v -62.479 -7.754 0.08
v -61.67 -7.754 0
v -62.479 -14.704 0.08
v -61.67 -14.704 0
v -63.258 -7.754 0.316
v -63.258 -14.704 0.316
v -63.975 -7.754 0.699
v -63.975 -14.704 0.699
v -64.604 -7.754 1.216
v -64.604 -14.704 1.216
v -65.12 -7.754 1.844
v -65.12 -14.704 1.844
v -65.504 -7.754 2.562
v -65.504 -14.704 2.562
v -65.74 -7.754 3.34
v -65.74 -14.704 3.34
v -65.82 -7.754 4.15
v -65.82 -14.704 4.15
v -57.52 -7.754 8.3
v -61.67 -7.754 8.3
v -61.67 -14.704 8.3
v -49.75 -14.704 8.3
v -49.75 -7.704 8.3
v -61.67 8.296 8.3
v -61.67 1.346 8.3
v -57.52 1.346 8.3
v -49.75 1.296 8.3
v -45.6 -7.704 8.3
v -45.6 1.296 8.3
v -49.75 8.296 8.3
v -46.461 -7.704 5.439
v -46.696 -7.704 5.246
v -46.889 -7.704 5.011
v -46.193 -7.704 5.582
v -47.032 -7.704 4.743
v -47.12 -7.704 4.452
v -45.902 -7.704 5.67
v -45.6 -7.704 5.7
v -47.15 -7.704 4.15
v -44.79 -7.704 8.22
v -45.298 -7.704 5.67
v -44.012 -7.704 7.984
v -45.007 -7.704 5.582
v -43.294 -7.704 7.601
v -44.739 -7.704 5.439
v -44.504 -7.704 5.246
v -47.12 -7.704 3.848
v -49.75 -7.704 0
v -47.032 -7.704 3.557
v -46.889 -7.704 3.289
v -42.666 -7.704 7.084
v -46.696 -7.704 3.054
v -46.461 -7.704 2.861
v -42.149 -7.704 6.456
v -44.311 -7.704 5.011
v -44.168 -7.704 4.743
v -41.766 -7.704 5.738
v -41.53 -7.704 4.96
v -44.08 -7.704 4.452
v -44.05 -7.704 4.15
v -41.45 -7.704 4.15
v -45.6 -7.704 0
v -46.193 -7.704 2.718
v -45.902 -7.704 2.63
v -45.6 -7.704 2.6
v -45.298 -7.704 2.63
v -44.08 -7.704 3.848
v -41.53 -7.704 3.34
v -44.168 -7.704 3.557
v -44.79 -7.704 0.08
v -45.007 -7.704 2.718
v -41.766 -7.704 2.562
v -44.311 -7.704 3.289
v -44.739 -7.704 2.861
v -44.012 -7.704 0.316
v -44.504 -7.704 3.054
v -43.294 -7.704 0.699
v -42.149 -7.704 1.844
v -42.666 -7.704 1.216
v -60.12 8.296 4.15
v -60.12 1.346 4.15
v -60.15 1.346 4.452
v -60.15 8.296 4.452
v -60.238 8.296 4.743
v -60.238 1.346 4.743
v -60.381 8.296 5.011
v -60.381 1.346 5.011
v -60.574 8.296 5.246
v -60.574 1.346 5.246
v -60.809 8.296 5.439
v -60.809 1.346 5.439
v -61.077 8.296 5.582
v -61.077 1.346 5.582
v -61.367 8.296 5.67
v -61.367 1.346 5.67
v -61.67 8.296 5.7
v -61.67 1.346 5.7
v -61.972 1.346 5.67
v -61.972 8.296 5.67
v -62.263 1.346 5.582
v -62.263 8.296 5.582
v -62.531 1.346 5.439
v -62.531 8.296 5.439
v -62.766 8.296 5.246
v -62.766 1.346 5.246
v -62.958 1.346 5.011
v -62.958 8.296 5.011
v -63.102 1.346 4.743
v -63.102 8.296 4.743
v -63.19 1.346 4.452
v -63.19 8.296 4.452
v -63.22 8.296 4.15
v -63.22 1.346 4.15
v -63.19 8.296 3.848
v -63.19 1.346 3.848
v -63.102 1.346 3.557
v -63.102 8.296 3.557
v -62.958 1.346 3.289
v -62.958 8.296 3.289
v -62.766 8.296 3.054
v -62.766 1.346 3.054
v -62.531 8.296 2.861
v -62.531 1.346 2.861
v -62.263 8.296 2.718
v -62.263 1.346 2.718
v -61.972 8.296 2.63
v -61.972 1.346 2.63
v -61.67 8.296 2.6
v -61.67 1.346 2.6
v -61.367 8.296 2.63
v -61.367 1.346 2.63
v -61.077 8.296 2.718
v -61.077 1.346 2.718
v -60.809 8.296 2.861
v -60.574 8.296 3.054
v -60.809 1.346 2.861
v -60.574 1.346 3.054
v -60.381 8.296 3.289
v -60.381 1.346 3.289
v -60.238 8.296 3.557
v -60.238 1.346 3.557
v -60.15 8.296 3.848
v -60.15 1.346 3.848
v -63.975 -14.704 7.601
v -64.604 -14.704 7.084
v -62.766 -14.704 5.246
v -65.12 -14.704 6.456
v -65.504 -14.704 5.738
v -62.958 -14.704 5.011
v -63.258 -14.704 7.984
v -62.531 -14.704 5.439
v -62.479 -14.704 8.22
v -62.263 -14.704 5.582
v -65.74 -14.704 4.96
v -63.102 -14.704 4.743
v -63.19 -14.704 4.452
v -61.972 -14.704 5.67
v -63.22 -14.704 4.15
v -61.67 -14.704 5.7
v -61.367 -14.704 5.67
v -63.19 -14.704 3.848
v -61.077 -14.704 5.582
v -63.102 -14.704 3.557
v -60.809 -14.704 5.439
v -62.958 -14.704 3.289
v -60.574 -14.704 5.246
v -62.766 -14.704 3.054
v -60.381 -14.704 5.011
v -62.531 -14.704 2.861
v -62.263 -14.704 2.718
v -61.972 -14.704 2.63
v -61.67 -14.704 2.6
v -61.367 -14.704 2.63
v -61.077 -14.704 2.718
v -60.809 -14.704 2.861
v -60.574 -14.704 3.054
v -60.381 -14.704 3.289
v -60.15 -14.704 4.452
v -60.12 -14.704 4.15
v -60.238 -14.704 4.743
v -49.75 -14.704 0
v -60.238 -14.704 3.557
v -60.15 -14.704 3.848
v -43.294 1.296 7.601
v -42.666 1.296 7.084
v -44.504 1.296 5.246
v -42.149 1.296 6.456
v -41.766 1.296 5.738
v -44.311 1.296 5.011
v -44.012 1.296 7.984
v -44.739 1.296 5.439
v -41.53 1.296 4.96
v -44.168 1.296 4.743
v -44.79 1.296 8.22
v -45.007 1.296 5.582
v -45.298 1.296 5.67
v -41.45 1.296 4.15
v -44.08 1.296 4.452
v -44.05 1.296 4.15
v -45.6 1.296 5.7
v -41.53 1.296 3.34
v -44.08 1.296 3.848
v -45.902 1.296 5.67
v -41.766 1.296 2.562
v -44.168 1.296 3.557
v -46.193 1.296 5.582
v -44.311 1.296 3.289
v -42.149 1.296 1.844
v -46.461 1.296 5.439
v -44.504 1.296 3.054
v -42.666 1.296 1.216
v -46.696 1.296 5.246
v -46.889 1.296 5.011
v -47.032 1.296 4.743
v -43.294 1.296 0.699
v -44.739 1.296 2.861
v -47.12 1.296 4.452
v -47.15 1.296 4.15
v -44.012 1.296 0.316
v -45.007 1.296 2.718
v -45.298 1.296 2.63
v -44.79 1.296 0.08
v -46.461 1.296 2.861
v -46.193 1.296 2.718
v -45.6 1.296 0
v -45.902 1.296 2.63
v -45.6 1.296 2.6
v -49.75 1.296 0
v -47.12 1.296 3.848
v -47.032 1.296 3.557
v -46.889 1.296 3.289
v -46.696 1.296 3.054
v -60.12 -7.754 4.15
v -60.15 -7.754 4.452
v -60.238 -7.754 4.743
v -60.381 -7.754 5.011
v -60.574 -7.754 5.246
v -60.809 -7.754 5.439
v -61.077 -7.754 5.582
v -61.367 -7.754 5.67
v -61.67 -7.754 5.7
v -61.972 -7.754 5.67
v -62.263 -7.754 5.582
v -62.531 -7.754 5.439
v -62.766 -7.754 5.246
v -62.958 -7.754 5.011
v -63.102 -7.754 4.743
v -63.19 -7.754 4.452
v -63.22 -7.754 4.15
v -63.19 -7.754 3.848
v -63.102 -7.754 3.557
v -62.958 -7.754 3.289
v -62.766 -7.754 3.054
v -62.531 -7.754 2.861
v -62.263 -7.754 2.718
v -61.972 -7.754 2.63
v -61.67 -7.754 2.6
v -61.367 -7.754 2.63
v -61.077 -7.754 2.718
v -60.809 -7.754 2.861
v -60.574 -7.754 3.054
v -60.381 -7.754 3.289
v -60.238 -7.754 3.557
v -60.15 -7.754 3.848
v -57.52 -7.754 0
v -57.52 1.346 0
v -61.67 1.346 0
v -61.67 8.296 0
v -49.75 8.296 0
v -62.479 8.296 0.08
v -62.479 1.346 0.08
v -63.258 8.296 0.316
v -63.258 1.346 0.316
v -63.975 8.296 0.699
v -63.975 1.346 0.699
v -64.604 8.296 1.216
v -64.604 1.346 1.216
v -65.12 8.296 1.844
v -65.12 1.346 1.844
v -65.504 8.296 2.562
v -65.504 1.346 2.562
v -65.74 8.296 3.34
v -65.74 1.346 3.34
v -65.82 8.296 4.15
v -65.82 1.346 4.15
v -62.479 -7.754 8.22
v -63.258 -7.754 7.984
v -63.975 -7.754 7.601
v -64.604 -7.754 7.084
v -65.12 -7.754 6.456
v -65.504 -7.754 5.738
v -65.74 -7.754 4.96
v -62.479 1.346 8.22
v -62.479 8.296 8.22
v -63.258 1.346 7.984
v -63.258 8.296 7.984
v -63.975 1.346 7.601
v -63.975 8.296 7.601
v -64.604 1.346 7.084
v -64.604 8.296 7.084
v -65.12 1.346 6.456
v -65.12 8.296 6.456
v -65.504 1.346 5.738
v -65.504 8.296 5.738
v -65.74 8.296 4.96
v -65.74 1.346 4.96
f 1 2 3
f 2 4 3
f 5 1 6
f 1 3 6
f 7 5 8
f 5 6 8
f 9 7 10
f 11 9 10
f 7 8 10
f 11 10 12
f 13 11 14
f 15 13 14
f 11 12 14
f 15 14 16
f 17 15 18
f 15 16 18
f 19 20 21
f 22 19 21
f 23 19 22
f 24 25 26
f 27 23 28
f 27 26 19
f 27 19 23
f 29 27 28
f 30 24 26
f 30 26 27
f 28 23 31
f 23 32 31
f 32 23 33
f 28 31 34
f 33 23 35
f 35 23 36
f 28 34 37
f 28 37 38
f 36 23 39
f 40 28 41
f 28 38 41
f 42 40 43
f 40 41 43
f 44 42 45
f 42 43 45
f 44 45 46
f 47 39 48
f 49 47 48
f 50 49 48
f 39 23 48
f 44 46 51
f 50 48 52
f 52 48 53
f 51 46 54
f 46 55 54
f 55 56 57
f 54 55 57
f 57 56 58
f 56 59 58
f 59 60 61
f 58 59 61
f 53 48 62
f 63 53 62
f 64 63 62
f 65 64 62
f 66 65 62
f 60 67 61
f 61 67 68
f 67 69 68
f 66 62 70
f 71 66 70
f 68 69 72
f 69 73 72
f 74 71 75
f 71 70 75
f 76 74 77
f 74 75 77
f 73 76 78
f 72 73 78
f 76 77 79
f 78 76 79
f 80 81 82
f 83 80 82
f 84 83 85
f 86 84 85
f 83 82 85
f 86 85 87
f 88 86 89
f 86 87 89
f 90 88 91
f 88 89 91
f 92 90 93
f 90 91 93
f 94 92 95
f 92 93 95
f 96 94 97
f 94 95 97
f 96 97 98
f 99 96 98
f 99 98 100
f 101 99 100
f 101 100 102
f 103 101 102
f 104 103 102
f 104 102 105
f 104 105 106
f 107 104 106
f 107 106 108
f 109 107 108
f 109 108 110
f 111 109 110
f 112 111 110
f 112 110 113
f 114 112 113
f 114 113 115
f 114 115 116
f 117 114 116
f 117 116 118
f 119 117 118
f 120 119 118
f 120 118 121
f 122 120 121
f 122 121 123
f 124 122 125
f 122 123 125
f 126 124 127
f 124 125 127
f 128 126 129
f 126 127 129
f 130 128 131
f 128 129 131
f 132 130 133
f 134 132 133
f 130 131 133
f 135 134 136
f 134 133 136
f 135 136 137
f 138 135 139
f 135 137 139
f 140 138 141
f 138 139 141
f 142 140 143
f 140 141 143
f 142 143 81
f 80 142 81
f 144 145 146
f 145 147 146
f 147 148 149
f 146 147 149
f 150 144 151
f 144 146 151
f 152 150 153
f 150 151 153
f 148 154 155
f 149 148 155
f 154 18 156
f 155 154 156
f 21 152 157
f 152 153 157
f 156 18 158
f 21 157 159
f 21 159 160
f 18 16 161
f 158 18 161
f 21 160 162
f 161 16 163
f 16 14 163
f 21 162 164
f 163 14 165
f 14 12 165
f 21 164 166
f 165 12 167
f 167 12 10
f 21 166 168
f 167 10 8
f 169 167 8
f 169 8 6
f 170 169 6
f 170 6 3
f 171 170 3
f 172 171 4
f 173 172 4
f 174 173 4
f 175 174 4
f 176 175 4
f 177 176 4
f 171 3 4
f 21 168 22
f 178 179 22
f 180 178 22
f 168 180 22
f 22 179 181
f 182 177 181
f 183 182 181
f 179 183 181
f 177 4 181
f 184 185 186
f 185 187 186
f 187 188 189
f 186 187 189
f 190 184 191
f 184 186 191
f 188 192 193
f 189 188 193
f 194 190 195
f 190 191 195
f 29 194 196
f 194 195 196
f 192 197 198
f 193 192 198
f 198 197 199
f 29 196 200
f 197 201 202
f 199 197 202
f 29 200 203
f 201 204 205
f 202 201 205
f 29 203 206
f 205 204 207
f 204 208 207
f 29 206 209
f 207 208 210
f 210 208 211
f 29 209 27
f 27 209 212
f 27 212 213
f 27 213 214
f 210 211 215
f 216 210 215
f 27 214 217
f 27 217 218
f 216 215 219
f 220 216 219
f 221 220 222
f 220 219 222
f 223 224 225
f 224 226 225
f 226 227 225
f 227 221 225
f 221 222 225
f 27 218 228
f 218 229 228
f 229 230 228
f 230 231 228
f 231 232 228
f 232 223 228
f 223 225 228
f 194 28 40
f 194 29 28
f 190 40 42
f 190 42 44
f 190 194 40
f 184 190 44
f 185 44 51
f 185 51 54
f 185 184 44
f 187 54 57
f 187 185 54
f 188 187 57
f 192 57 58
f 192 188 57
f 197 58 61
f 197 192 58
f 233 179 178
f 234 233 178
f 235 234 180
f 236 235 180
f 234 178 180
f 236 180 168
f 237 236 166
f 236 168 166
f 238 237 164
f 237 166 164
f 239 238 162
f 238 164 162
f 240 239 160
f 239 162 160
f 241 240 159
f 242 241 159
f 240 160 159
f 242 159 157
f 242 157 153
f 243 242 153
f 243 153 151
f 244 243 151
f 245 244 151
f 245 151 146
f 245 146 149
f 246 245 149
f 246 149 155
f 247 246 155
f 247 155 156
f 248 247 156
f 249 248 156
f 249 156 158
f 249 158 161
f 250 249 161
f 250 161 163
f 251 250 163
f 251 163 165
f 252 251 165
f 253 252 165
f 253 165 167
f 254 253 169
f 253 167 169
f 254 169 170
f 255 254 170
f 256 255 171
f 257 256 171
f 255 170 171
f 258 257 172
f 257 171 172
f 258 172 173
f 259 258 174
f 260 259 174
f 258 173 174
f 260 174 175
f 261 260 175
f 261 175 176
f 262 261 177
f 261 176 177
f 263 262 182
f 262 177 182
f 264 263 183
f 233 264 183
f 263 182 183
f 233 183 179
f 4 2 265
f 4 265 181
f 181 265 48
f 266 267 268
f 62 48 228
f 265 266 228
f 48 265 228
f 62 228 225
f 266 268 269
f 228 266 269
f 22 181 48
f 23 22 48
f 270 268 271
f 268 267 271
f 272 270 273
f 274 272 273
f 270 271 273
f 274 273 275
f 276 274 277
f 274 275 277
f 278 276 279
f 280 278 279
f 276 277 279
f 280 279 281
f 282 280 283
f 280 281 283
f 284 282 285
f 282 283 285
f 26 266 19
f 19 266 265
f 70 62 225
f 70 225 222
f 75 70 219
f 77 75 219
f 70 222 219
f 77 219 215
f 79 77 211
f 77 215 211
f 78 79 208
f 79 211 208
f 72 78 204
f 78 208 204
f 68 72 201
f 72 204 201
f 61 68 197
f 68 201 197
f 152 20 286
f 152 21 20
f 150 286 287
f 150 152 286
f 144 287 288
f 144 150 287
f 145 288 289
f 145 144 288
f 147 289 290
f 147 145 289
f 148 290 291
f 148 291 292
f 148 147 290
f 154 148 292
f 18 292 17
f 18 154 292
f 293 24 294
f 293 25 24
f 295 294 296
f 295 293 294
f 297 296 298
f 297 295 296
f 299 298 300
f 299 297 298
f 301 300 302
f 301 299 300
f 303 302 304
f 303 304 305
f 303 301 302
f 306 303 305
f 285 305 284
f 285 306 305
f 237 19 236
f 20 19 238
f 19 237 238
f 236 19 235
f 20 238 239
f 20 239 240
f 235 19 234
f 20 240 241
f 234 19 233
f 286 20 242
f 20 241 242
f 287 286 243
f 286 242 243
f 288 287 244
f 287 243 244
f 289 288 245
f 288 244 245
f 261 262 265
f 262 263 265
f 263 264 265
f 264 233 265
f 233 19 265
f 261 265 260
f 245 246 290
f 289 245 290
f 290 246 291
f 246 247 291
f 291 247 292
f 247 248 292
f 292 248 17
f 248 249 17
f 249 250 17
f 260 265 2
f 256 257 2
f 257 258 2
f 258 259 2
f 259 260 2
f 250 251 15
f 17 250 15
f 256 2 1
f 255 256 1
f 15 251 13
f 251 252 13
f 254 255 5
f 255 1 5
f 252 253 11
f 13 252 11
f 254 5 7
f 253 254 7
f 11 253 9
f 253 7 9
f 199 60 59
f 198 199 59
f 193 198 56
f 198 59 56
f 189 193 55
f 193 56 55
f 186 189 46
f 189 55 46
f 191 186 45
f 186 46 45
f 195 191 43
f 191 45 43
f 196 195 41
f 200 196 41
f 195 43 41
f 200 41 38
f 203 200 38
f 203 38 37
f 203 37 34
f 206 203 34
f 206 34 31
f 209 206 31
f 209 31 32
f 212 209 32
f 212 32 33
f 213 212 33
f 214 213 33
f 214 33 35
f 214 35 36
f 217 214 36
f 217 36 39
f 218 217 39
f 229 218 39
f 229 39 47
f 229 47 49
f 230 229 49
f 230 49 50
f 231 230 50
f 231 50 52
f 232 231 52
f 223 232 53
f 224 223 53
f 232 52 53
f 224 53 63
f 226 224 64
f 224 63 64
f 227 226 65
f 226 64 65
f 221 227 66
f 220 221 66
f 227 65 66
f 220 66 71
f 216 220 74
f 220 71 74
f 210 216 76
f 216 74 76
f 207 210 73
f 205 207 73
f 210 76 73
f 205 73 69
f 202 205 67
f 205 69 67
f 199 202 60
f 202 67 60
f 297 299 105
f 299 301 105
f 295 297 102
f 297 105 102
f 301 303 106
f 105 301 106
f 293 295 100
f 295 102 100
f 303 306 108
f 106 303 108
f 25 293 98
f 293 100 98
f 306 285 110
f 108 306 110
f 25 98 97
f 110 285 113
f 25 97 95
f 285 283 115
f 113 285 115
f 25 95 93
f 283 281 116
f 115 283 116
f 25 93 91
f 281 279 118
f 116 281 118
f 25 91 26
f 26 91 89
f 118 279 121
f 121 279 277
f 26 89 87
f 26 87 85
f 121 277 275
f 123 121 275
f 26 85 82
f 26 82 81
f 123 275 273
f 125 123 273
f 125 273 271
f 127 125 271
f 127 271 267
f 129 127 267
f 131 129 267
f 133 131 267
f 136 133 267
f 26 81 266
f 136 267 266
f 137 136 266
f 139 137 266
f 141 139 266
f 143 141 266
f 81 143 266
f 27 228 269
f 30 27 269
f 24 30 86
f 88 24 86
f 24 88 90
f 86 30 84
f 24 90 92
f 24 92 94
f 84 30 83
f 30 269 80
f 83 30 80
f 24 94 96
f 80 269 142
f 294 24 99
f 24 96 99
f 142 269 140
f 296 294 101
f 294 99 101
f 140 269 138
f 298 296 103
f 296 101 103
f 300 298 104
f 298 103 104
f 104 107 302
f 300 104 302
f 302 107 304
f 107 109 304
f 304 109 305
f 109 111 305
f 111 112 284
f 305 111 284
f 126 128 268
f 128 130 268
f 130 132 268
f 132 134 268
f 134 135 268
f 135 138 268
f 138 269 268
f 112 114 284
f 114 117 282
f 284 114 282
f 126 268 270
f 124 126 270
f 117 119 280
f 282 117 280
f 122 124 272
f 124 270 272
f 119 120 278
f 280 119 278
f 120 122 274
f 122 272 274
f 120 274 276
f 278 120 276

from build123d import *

# Parameters (mm, degrees)
F1_DEPTH = 8.3
F2_R     = 1.55
F3_DEPTH = 23.001
F4_R     = 1.55
F5_DEPTH = 16.001
F6_R     = 4.14999


# Not quite as in the source:
# - a fillet or chamfer is up to 0.001 mm smaller than in the source, because OpenCascade refuses the exact size


with BuildPart() as f1:
    # F0 (on Top) → F1 (new body)
    with BuildSketch(Plane.XY):
        Polygon((-57.5197213515, -7.7541078215), (-65.8197213515, -7.7541078215), (-65.8197213515, -14.7041078215), (-49.7500874824, -14.7041078215), (-49.7500874824, -7.7041078215), (-41.4500874824, -7.7041078215), (-41.4500874824, 1.2958921785), (-49.7500874824, 1.2958921785), (-49.7500874824, 8.2958921785), (-65.8197213515, 8.2958921785), (-65.8197213515, 1.3458921785), (-57.5197213515, 1.3458921785), align=None)
    extrude(amount=F1_DEPTH)

    # F2 (on face) → F3 (cut, through all)
    with BuildSketch(Plane.XZ.offset(14.7041078215)):
        with Locations((-61.6697213515, 4.15)):
            Circle(F2_R)
    extrude(amount=-F3_DEPTH, mode=Mode.SUBTRACT)

    # F4 (on face) → F5 (cut, through all)
    with BuildSketch(Plane.XZ.offset(7.7041078215)):
        with Locations((-45.6000874824, 4.15)):
            Circle(F4_R)
    extrude(amount=-F5_DEPTH, mode=Mode.SUBTRACT)

    # F6 (radius 4.15 in the source; OpenCascade refuses exactly that, so slightly less here)
    f6_edges = [f1.edges().sort_by_distance(p)[0] for p in [
        (-65.819721, 4.820892, 8.3),
        (-65.819721, 4.820892, 0),
        (-65.819721, -11.229108, 0),
        (-65.819721, -11.229108, 8.3),
        (-41.450087, -3.204108, 0),
        (-41.450087, -3.204108, 8.3),
    ]]
    fillet(f6_edges, radius=F6_R)


solid = f1.part
